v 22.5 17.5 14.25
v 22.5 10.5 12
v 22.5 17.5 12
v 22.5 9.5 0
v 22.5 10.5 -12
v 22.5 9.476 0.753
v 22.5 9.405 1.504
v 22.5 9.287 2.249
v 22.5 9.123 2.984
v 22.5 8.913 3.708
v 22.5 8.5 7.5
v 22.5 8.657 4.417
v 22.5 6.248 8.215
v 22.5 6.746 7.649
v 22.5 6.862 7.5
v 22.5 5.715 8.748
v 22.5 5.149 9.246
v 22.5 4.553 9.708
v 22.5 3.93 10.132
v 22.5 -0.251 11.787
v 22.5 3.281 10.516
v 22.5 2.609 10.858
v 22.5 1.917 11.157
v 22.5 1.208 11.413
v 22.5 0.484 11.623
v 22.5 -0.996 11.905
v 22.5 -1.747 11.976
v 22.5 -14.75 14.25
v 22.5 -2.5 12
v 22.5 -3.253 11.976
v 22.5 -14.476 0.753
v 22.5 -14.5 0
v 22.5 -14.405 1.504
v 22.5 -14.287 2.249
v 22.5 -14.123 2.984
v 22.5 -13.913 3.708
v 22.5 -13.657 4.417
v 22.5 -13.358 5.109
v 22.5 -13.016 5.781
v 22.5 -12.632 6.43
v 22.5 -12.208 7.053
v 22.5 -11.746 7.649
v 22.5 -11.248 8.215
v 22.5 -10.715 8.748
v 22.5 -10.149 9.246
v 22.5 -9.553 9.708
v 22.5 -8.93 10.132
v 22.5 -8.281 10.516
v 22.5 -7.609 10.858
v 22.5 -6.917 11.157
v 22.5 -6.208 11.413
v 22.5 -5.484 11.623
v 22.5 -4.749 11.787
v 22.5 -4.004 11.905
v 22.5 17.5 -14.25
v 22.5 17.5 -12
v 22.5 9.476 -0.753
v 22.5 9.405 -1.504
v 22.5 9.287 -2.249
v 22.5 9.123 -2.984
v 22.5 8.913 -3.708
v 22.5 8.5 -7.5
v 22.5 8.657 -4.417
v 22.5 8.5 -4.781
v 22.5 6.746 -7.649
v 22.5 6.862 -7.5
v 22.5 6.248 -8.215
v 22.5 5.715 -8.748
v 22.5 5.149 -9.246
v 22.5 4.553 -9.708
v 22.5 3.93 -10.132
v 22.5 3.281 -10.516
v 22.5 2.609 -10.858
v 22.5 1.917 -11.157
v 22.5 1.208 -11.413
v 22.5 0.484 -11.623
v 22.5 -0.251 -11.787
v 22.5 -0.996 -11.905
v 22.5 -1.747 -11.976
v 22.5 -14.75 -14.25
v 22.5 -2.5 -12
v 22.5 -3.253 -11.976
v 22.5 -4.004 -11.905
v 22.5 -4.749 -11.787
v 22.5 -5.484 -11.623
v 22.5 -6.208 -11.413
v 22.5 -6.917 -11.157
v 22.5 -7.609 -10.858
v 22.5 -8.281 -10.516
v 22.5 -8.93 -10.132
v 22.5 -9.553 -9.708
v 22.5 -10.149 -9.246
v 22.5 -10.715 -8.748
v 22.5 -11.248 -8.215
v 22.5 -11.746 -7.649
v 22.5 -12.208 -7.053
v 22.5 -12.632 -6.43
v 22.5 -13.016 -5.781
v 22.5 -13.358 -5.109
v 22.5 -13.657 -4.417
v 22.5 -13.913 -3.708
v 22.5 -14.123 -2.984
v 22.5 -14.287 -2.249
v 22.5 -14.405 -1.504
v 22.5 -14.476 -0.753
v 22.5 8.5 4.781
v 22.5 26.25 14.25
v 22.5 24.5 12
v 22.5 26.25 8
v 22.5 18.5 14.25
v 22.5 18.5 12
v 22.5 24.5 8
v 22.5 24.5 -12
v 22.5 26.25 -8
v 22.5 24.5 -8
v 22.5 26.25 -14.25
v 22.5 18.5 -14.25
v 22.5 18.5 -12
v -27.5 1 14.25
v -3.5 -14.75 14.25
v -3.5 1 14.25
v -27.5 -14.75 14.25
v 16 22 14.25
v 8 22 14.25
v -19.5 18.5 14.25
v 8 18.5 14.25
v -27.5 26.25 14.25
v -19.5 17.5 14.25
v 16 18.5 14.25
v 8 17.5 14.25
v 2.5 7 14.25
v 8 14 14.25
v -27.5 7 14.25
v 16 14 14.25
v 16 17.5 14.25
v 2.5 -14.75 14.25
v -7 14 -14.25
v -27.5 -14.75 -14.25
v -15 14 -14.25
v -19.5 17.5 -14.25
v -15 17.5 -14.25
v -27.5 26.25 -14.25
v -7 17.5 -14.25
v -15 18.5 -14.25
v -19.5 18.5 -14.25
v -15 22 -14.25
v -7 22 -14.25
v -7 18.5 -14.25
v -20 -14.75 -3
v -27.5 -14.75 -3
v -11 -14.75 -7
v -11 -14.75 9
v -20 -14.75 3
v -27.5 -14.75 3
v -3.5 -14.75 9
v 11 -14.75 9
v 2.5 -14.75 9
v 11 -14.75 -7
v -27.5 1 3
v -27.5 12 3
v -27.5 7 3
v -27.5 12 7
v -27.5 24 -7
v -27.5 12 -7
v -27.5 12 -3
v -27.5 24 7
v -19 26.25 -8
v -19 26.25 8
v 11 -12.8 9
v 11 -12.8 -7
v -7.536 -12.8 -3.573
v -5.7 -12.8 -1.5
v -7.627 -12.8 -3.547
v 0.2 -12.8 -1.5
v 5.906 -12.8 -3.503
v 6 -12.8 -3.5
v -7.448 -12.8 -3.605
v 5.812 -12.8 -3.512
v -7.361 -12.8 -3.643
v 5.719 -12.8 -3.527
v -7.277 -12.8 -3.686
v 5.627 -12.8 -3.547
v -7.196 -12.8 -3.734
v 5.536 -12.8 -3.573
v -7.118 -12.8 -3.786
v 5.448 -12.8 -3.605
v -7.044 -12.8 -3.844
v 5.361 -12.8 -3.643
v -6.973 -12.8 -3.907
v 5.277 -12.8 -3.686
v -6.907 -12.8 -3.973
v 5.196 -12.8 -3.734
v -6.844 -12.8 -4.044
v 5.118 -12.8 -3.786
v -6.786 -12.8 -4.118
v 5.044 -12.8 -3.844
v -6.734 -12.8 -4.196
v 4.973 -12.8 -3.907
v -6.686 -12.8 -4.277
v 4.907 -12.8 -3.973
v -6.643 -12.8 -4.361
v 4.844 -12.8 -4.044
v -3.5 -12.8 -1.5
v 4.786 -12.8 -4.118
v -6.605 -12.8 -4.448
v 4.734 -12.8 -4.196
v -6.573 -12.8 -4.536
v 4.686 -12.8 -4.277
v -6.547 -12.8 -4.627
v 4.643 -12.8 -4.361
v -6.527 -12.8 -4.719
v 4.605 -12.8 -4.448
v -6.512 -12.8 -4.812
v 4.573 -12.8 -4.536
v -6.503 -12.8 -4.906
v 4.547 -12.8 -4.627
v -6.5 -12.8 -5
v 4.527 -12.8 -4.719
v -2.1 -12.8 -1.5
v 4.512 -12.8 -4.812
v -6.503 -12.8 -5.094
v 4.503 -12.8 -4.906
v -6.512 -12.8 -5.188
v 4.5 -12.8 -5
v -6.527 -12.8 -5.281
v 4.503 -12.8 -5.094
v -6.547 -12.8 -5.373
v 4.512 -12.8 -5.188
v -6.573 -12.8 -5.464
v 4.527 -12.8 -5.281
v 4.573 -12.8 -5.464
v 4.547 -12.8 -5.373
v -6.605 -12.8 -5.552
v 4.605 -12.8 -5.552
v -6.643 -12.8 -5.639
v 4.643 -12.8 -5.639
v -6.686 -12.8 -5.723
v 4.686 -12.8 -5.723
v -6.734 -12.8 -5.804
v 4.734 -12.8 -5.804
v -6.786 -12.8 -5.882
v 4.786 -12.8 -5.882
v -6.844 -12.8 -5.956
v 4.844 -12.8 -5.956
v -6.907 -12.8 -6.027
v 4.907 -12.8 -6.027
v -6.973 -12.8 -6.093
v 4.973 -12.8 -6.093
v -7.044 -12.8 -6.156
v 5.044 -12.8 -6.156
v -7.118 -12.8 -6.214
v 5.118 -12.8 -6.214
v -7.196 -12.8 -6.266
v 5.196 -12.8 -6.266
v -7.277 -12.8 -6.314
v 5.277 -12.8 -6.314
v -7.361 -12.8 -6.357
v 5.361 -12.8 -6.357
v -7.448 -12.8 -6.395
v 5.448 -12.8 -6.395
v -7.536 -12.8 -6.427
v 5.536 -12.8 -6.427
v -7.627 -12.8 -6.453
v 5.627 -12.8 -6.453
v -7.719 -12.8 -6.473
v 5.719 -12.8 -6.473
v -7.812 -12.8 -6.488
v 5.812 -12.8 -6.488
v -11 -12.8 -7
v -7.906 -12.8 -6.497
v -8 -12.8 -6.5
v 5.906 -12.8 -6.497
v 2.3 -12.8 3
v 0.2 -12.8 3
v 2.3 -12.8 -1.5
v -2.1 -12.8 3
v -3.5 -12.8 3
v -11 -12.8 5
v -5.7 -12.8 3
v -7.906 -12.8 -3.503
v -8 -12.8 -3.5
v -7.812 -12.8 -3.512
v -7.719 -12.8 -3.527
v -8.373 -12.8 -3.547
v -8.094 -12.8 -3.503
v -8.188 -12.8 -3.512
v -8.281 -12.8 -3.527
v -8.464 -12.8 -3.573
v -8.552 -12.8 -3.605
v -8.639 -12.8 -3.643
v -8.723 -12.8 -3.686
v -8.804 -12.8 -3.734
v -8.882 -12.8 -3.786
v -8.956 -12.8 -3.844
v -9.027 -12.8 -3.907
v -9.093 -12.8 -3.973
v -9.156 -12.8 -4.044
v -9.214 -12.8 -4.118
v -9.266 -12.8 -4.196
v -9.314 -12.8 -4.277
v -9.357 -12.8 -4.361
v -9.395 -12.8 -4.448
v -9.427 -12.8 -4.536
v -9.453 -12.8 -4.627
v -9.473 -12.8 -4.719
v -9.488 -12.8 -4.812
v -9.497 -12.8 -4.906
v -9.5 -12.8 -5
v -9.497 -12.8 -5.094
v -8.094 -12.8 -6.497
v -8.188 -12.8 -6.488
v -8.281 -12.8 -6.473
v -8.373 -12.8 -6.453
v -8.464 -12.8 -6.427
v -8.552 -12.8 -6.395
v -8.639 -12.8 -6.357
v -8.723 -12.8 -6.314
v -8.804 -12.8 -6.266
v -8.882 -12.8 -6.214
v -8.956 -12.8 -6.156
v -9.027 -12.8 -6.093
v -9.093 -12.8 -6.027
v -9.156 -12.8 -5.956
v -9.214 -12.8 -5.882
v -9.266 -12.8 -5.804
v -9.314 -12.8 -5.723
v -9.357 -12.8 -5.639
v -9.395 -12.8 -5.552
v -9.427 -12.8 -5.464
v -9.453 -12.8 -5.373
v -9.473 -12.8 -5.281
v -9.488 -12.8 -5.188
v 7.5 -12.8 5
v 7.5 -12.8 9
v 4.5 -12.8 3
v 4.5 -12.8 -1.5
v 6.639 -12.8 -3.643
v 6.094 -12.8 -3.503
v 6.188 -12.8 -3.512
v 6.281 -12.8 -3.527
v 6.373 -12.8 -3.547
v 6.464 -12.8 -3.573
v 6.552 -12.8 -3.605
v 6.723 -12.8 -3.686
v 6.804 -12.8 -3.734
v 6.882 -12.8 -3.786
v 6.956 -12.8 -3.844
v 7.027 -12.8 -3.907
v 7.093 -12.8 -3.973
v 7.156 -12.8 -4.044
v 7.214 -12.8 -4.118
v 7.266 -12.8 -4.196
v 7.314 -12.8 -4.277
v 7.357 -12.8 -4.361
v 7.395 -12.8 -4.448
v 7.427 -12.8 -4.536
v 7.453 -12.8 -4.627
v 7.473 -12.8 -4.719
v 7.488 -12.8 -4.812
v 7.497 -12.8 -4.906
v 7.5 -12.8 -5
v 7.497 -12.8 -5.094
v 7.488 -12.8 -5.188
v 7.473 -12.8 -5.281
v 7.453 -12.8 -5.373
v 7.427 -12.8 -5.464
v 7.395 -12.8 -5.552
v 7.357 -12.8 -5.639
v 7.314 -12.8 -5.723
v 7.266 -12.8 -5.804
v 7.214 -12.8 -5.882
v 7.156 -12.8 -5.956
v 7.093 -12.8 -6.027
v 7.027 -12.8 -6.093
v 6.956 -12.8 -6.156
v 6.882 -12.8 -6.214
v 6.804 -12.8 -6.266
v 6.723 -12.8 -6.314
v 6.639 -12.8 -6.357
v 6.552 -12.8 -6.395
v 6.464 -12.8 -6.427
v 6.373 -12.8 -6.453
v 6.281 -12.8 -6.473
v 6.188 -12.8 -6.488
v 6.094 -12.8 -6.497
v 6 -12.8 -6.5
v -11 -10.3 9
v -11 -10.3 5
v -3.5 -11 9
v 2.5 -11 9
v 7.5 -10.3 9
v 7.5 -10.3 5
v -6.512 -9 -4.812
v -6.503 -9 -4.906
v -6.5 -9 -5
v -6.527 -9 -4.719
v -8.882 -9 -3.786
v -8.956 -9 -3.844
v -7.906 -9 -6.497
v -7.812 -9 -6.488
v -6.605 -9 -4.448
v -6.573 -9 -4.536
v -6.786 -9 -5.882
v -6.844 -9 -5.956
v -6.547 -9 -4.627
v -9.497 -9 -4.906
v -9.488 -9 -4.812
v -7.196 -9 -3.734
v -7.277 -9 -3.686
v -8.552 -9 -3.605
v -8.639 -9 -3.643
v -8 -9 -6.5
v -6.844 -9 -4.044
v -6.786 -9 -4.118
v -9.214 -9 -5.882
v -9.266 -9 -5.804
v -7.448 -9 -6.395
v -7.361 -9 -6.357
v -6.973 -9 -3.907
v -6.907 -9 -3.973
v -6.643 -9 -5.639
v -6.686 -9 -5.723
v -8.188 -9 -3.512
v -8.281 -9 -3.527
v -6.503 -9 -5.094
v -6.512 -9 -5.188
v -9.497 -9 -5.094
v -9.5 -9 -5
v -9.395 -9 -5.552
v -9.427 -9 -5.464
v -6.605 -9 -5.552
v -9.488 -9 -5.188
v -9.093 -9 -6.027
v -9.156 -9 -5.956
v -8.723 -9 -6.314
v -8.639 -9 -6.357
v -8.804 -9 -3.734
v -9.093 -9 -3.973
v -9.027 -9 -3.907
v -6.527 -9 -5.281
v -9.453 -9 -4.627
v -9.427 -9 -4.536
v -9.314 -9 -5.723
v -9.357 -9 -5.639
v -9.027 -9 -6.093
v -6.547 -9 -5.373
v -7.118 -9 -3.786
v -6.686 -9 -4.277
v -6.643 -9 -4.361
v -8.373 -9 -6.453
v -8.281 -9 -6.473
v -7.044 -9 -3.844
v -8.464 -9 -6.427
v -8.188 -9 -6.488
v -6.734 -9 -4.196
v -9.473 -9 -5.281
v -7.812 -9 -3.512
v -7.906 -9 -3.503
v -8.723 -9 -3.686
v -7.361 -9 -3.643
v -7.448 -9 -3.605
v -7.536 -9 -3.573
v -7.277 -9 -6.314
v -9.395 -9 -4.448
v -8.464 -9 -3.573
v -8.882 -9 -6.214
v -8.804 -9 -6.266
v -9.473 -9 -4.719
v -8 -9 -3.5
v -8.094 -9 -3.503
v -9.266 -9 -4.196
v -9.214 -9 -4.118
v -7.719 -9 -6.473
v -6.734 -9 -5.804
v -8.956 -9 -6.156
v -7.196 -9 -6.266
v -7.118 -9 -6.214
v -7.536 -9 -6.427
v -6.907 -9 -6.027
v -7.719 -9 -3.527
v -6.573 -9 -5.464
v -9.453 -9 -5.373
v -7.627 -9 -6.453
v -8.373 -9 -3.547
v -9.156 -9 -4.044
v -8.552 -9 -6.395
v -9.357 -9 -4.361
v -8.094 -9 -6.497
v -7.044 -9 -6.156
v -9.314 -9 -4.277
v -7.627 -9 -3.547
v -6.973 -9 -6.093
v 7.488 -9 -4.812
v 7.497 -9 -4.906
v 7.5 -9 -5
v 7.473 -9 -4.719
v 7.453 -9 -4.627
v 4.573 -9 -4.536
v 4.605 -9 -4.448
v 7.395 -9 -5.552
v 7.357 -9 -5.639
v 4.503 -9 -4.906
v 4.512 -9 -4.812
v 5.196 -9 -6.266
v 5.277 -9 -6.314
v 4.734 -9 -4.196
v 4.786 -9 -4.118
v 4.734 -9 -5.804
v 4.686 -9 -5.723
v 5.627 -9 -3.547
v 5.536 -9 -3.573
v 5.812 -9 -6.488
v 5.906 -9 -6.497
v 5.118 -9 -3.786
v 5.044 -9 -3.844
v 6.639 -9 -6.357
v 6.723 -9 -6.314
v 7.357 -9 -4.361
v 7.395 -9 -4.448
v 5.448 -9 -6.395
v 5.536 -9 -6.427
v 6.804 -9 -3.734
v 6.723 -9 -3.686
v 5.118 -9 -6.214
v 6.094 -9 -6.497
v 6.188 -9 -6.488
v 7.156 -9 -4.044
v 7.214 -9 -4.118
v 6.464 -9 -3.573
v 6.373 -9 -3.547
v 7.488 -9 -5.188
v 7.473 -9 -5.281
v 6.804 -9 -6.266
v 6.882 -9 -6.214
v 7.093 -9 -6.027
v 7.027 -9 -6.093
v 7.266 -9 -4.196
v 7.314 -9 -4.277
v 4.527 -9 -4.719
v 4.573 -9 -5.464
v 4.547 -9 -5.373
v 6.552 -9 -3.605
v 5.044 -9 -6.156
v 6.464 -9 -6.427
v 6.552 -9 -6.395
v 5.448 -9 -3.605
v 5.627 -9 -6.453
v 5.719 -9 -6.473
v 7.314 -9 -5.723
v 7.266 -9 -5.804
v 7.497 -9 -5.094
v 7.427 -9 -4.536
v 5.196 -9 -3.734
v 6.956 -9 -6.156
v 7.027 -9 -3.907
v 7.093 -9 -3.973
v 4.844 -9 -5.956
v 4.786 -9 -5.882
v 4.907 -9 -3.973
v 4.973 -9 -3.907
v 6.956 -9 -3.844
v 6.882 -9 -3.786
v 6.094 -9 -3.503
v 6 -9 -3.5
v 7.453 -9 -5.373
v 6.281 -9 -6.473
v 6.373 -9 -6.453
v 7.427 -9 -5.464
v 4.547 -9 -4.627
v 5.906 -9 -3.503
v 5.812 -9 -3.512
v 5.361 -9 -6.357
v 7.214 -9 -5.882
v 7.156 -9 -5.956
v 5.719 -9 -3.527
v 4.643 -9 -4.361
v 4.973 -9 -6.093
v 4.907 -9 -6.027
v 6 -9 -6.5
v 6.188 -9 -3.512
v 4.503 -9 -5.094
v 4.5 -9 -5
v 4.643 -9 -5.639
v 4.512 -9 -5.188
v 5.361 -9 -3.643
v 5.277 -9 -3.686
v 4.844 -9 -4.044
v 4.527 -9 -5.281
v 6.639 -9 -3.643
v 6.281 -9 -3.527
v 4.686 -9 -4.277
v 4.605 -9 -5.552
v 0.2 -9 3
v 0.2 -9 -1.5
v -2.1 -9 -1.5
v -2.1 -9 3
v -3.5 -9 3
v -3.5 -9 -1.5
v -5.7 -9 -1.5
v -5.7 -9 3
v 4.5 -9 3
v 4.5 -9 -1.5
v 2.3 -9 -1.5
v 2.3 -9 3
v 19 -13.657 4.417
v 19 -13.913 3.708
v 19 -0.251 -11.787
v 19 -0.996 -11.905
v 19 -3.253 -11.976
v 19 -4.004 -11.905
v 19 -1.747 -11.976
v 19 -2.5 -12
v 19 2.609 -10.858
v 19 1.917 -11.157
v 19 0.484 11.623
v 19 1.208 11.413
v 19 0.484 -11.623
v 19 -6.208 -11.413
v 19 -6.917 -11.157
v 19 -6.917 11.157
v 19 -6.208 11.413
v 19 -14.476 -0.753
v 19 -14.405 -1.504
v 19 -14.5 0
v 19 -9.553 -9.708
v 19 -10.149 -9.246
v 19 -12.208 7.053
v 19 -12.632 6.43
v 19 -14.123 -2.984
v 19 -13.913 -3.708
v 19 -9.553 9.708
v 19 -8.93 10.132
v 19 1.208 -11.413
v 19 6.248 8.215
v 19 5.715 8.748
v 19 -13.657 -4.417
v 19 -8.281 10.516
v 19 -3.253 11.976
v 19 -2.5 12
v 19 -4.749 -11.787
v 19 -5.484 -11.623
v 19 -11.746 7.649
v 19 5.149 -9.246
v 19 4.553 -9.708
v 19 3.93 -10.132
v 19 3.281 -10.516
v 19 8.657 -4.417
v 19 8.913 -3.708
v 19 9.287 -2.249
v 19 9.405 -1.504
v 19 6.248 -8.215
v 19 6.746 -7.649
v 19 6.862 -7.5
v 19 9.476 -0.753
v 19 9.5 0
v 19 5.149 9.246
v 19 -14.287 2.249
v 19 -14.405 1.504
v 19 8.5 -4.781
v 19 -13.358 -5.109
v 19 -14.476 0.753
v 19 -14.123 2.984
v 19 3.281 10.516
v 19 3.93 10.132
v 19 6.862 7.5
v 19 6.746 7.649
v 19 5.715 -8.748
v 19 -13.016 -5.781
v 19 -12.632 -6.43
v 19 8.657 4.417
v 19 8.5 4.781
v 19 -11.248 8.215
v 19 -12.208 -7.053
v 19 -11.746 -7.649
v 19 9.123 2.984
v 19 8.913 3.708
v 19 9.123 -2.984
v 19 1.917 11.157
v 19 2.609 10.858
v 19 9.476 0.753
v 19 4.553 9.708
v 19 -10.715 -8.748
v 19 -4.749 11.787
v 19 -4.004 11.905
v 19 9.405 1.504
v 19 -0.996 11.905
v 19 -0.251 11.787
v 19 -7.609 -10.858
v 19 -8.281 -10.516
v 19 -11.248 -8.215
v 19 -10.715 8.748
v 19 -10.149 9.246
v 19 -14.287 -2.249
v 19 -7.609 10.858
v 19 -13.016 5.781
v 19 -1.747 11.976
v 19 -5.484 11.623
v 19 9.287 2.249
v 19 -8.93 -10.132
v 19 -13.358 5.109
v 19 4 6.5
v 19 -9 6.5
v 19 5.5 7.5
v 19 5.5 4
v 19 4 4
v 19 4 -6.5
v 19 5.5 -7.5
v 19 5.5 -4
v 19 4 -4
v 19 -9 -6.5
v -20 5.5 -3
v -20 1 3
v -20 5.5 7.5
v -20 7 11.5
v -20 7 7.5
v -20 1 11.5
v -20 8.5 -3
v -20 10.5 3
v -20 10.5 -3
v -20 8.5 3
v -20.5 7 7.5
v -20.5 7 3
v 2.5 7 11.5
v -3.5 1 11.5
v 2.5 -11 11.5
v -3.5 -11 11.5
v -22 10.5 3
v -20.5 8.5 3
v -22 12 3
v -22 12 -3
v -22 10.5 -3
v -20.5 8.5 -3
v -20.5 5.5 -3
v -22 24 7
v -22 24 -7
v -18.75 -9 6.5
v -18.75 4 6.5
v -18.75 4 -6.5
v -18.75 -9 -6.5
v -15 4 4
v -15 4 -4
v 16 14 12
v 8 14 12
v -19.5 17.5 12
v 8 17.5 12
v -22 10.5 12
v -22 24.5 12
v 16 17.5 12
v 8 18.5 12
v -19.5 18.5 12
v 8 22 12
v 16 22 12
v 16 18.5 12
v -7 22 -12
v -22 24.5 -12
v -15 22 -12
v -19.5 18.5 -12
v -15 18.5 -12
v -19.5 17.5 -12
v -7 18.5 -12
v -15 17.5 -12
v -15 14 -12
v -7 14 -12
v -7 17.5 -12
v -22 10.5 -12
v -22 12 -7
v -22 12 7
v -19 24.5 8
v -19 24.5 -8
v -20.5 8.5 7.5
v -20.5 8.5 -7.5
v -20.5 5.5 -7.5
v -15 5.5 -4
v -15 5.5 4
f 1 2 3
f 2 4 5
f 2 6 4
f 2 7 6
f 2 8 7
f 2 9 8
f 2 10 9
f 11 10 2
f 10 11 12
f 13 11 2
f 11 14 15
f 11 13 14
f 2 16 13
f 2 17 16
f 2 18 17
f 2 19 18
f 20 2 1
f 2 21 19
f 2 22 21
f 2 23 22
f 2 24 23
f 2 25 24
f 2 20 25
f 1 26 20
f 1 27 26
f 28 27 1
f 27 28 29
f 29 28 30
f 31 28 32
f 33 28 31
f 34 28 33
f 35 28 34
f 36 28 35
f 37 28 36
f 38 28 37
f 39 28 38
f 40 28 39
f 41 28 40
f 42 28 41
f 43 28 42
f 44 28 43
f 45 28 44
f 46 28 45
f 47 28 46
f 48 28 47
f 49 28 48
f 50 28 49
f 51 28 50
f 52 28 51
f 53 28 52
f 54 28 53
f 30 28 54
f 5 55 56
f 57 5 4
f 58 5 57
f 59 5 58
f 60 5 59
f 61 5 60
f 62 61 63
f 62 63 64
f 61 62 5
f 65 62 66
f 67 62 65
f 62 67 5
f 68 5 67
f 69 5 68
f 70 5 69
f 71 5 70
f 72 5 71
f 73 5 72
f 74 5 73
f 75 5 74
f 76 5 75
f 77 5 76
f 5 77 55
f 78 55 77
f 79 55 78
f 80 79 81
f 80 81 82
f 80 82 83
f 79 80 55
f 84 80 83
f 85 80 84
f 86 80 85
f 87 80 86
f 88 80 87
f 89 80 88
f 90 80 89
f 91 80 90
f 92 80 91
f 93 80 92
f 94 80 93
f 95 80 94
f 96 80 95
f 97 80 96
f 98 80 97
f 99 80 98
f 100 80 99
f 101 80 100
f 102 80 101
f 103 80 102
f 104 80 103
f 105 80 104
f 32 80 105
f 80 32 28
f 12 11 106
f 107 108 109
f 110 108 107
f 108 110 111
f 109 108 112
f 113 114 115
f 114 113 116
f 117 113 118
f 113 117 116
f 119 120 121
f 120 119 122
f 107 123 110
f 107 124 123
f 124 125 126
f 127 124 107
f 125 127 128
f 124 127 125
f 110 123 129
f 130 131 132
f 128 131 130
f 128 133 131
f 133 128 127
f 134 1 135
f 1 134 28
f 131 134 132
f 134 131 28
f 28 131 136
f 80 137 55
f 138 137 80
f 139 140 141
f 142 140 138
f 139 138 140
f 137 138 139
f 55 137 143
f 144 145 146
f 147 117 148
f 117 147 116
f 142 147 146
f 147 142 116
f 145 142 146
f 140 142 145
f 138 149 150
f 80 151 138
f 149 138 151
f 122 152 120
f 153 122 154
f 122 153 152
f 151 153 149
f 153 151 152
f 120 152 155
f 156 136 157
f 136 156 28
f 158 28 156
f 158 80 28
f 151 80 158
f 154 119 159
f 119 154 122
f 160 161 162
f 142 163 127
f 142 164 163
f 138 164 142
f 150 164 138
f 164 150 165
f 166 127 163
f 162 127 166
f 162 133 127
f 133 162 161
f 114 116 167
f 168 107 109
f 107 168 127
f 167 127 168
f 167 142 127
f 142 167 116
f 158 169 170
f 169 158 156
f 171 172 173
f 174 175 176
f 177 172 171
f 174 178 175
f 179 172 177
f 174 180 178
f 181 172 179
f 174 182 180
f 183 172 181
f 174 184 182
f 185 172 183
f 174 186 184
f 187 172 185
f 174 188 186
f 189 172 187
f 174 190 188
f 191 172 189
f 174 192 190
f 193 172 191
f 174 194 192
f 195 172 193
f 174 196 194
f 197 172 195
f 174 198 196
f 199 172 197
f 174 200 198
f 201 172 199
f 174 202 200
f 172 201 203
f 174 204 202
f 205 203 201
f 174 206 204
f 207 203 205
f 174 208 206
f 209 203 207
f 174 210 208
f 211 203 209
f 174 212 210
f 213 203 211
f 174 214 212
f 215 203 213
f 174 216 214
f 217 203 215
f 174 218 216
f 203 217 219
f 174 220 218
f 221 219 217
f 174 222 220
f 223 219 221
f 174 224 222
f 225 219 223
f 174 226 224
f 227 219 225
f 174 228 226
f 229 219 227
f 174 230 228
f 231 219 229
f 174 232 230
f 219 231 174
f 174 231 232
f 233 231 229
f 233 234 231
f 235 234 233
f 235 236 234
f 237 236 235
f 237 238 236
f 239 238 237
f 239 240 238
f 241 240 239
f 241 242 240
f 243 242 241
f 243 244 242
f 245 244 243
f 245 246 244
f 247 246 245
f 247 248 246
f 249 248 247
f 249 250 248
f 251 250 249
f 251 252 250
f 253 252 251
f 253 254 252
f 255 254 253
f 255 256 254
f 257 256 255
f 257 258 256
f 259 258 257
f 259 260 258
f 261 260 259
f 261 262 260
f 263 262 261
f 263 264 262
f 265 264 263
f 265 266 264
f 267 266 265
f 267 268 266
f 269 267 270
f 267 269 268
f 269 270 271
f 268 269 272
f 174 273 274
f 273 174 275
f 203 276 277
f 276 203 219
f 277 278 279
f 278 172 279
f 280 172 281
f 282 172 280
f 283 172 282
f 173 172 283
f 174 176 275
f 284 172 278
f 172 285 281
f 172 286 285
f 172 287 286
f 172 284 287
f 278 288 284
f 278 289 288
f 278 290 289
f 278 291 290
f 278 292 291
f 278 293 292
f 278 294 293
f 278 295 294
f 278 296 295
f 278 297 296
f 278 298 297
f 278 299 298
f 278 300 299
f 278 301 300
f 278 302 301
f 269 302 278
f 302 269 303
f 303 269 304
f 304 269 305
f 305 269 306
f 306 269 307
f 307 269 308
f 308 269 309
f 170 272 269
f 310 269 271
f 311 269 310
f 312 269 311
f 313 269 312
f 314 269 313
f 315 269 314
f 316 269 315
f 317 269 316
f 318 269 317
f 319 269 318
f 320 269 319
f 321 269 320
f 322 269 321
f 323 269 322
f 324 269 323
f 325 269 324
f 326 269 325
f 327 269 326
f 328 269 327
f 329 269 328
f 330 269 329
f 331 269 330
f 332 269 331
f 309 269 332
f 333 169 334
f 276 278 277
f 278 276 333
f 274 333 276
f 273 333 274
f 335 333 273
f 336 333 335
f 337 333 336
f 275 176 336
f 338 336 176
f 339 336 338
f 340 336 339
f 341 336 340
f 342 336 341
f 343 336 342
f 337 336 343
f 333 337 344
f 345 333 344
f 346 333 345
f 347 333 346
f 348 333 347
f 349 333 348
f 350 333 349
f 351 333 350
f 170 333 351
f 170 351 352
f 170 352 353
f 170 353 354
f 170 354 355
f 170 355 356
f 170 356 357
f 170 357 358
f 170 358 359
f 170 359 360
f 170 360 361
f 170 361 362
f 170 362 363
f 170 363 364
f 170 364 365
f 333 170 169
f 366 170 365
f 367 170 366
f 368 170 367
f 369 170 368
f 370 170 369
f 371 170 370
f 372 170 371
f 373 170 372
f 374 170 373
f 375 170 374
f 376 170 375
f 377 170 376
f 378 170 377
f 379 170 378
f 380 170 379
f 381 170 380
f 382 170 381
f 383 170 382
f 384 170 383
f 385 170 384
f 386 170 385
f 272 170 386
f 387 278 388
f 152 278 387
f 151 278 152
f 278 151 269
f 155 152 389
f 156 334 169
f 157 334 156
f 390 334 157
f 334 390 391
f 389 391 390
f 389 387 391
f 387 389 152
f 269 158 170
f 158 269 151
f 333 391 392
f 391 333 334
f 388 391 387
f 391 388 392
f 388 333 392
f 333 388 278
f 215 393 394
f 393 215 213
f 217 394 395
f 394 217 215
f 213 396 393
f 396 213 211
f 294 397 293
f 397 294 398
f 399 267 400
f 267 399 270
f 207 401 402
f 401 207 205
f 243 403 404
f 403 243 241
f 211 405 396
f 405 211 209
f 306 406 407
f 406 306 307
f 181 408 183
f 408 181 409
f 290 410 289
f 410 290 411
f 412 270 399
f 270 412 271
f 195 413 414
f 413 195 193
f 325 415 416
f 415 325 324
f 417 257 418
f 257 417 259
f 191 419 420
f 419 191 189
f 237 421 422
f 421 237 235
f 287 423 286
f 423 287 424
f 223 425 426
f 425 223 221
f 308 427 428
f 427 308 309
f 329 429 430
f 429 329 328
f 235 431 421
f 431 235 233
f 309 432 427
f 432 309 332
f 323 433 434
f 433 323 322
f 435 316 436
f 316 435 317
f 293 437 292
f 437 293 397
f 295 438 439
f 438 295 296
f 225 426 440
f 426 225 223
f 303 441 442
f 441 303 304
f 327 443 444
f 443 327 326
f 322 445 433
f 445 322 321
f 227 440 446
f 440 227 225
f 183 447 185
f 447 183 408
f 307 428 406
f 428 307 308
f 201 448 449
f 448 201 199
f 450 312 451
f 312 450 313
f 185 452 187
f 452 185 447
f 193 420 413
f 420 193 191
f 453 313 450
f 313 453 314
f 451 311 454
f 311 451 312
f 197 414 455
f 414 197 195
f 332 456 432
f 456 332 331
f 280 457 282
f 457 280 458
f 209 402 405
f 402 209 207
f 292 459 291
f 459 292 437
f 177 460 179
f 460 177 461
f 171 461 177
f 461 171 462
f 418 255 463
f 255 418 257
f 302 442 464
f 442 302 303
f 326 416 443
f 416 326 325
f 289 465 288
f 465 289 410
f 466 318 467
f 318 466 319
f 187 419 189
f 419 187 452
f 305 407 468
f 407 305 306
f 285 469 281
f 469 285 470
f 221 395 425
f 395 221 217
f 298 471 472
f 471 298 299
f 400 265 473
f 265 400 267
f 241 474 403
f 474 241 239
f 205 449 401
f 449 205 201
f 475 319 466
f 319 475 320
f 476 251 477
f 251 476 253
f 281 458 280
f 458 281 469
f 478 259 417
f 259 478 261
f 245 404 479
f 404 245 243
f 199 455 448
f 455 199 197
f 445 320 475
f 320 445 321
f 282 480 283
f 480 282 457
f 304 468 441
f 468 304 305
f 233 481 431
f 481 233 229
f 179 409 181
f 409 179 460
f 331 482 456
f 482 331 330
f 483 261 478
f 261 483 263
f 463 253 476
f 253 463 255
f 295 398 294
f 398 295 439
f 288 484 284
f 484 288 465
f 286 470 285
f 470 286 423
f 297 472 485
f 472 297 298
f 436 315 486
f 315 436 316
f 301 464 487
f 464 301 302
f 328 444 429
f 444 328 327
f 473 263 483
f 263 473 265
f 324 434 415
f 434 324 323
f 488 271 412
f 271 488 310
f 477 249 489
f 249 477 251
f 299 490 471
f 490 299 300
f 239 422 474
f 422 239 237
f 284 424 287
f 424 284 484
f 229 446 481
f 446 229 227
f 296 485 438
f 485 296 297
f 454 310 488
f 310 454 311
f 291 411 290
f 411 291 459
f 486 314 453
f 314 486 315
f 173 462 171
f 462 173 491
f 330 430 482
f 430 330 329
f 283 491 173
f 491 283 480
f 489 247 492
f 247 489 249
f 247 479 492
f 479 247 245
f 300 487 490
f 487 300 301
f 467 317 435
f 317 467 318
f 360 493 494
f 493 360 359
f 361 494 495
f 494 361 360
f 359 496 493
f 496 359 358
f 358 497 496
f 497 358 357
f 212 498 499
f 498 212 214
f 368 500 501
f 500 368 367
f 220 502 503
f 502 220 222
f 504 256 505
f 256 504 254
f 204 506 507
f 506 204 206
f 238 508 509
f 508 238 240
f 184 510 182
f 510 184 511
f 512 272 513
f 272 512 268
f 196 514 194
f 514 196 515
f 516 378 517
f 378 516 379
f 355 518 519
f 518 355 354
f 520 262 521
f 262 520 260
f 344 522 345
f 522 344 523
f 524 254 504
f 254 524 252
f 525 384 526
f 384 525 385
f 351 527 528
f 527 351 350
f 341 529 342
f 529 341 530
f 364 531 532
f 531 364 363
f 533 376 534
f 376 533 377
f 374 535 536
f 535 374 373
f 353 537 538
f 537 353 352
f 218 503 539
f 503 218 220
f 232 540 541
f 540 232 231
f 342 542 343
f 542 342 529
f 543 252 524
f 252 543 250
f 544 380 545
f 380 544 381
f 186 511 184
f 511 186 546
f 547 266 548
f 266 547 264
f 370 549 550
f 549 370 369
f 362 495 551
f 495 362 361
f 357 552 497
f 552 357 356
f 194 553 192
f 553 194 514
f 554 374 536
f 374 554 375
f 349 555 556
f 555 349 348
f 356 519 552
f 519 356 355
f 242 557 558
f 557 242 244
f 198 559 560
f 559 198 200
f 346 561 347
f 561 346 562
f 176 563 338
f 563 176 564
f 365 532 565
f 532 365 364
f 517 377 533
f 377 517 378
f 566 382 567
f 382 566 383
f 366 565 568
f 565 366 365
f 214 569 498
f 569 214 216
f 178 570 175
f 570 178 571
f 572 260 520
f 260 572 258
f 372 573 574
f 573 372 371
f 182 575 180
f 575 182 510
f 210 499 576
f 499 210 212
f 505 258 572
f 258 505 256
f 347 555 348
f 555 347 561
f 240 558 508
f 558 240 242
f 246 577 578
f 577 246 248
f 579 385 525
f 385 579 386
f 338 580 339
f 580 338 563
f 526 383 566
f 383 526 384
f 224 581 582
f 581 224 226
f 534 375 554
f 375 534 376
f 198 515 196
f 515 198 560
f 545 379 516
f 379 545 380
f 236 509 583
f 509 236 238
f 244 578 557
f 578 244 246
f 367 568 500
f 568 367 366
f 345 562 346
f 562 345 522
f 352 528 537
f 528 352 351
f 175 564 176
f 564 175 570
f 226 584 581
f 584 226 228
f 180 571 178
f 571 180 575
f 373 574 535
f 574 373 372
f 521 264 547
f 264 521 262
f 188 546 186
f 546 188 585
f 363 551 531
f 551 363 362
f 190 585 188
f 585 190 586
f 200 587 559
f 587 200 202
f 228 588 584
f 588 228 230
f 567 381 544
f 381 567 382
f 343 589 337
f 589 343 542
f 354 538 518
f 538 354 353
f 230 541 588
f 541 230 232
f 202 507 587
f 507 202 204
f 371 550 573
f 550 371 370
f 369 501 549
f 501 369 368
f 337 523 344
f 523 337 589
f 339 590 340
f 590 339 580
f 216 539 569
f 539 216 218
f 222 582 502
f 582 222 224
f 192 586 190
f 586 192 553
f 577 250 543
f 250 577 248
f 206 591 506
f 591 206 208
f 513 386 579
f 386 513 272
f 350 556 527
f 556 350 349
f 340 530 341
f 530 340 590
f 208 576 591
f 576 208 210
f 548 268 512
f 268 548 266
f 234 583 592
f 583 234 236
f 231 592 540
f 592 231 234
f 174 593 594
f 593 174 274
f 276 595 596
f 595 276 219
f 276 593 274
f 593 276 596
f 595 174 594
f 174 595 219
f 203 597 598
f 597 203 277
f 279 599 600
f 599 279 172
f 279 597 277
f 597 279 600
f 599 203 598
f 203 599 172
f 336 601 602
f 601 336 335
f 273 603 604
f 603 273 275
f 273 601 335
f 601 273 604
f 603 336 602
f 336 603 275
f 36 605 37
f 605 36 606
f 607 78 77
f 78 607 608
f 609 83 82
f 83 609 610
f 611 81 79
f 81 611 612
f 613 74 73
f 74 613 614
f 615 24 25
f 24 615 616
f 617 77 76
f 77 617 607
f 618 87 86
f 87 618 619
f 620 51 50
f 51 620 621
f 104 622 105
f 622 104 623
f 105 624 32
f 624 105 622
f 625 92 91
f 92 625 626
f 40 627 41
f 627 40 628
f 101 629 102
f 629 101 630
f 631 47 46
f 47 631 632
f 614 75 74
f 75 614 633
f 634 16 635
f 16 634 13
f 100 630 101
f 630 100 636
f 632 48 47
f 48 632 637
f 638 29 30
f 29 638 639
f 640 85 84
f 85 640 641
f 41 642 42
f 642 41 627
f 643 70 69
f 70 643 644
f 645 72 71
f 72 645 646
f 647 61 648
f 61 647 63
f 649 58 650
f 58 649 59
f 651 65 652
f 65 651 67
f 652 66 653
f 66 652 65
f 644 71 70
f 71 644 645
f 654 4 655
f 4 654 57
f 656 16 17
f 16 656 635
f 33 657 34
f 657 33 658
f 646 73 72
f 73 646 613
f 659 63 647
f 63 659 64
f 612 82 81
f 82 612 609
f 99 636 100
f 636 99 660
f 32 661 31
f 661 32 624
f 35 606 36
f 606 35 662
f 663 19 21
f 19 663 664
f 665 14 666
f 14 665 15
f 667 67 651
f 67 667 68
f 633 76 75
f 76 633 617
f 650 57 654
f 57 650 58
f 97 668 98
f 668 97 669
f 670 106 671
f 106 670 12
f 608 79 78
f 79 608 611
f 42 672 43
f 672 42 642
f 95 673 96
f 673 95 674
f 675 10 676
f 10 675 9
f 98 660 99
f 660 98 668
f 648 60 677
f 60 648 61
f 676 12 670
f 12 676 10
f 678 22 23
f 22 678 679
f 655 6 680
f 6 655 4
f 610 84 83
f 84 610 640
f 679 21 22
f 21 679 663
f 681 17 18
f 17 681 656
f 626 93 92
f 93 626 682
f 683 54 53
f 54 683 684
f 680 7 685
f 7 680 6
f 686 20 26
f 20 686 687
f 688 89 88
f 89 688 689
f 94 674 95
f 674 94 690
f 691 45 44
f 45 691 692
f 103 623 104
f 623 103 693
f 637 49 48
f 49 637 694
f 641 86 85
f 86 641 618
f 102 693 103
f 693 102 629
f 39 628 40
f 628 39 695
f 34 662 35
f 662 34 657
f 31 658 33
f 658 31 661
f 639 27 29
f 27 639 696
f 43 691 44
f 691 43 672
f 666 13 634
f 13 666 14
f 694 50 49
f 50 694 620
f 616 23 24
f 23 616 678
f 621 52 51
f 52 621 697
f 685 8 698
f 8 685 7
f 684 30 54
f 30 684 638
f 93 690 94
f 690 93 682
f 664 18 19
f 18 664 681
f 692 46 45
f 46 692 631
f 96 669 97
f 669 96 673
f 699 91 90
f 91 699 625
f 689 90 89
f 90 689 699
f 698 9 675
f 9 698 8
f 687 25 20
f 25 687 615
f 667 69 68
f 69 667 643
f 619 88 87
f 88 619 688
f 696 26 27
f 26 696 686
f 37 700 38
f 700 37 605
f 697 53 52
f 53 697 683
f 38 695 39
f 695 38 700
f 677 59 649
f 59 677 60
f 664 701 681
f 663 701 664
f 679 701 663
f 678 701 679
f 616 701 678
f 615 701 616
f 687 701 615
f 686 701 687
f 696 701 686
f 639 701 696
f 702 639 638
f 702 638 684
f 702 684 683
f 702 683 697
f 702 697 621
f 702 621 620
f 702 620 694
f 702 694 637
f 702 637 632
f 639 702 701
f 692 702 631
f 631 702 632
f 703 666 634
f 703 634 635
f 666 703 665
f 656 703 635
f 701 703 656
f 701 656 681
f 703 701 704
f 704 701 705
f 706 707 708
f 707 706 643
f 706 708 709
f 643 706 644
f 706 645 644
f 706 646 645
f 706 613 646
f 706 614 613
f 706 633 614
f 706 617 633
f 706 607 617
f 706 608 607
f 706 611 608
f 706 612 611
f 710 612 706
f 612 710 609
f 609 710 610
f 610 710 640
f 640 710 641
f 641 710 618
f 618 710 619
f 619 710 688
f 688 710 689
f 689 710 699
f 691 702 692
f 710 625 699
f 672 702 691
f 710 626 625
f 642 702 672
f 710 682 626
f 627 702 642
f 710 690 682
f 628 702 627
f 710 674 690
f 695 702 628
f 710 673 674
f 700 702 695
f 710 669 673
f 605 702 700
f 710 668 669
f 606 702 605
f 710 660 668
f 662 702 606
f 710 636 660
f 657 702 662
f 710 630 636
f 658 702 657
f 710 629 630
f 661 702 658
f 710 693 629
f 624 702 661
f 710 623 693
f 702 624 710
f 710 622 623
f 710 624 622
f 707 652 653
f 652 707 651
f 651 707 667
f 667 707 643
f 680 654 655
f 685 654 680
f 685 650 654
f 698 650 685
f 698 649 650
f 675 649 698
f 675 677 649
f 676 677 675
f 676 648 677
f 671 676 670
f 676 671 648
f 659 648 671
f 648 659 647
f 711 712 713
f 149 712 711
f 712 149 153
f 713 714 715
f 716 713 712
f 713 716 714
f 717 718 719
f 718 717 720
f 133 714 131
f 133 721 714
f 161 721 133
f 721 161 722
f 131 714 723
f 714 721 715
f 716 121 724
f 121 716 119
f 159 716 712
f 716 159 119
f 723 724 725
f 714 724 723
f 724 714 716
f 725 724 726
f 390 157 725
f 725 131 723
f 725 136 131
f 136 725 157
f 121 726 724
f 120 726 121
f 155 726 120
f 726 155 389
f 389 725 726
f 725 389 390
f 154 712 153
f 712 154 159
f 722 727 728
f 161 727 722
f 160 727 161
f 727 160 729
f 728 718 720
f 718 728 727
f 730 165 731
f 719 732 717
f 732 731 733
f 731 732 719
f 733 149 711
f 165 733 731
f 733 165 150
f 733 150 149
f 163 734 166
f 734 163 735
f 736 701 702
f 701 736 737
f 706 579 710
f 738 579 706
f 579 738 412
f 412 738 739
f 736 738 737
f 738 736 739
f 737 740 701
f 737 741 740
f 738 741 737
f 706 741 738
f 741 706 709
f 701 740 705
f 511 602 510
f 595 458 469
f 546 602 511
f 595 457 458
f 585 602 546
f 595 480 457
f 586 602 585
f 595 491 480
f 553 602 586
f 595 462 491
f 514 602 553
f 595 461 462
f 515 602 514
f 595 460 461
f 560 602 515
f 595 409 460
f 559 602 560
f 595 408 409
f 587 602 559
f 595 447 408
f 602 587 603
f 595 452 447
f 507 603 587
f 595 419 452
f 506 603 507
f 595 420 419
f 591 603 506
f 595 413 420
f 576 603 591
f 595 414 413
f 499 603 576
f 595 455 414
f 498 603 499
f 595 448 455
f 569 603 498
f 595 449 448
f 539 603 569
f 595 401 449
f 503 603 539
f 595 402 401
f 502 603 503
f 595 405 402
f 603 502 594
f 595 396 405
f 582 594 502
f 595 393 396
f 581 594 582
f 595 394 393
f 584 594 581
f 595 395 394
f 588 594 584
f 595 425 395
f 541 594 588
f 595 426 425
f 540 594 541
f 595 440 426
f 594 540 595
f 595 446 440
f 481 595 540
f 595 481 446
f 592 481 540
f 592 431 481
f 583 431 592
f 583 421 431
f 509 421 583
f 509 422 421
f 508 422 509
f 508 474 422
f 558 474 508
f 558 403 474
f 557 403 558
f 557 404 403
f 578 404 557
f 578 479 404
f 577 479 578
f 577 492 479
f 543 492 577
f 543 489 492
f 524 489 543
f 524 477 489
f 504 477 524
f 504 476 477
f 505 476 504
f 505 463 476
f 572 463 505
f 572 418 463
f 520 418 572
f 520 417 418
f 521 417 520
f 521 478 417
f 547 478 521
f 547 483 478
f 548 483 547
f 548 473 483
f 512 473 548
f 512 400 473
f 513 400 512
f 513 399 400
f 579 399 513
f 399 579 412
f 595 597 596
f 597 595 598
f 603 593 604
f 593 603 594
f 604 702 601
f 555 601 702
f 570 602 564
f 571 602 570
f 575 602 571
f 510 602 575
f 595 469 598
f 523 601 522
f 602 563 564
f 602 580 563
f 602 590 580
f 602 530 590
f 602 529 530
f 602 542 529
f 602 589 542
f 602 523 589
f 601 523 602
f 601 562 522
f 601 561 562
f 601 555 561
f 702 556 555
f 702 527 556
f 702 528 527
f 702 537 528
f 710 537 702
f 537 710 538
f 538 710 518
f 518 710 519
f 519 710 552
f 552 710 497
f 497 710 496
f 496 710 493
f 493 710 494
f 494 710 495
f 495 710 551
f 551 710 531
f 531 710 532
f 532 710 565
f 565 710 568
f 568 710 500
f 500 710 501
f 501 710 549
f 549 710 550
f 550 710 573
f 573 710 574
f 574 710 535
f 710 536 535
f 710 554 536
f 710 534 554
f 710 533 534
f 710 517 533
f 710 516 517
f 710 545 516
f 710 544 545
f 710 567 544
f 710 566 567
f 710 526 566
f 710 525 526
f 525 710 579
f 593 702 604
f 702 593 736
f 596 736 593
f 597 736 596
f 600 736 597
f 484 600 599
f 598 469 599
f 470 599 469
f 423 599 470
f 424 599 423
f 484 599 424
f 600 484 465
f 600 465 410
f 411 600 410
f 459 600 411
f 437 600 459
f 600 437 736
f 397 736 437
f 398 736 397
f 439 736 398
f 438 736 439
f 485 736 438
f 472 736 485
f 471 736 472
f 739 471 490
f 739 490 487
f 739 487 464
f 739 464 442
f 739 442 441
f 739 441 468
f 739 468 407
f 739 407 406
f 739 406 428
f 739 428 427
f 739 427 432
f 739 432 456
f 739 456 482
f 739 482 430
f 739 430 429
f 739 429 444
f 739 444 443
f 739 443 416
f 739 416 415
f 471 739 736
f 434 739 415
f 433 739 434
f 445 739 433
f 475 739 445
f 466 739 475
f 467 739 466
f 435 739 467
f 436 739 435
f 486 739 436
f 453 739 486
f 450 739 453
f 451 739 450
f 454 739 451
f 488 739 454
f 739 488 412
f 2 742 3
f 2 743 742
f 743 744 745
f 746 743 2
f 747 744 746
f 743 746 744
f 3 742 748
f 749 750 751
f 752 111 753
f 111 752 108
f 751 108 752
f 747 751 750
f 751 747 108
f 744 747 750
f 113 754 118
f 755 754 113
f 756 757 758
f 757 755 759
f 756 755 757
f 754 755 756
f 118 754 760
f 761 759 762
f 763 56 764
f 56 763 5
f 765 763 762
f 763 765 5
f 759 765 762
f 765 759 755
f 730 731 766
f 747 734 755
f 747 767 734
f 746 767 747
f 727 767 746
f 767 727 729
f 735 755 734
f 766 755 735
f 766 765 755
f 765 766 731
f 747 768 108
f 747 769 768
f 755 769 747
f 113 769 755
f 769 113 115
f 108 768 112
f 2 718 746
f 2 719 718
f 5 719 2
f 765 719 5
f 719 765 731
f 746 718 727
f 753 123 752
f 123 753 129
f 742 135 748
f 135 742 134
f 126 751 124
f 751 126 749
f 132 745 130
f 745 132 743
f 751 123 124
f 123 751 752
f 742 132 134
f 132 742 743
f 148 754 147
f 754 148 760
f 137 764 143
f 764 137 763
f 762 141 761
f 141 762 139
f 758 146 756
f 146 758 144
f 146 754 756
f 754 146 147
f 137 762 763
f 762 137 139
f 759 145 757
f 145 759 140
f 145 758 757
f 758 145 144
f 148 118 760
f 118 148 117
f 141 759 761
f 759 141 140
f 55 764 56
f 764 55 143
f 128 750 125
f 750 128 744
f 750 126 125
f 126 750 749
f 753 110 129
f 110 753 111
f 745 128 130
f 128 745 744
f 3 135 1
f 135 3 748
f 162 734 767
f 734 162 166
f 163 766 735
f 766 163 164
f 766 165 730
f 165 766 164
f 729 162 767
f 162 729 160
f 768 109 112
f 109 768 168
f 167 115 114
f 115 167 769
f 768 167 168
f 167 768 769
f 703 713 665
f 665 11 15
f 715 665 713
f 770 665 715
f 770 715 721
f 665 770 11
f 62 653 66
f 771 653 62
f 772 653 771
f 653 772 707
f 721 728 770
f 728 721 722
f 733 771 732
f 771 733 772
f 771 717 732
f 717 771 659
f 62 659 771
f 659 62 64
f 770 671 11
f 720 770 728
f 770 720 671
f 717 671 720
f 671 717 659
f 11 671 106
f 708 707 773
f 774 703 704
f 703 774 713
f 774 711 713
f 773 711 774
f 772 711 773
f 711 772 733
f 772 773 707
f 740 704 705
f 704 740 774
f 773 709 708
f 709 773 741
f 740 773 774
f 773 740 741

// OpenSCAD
height_pd1=12;
height_pd=12;
 
$fn = 100; 
 w_m5=26.0;// width of m5stick
 h_m5=45;// height of m5stick
 t_m5=16; // thickness of m5stick
 wall=1.5; //wall of the body
 tol=0.5; //tolerance for printing
 
 difference(){
 union() {

     
      translate([0,0,0]) 
     cube ([h_m5,w_m5+tol+3,w_m5+tol+2], center=true);  //cuvette holder
     
           translate([-5,0,0]) 
     cube ([h_m5,w_m5+tol+3,w_m5+tol+2], center=true);  //cuvette holder
     
     
       translate([0,18,0]) 
       cube ([h_m5, t_m5+tol, w_m5+tol+2], center=true);
     
            translate([-5,18,0]) 
       cube ([h_m5, t_m5+tol, w_m5+tol+2], center=true);
 }
 union() {
      

         
          translate([21.0,-2.5,0])
     rotate([0,90,0])
     cylinder(d=24, h=4, center=true);// space for cap
     
  translate([-10,-14.8,-7])
rotate([90,0,0])
ams2();   //space for AMS spectral sensor
     
           translate([-24.0,4,8]) 
            cube ([8, 6, 13], center=true);// for wiring4
    
             translate([-14.0,4,13]) 
            cube ([22, 6, 3], center=true);// for wiring3

      
                  translate([-0.5,-14,10]) 
            cube ([6, 6, 3], center=true);// for wiring3c
     
            translate([-0.5,-4,13]) 
            cube ([6, 22, 3], center=true);// for wiring2
     
           translate([-24.0,4,0]) 
            cube ([8, 40, 6], center=true);// for wiring1 bottom
     
     translate([4,-2.5,0]) 
          cube ([h_m5+tol,13.0,13.0], center=true); //cuvette
            color([1,0,0.5])
        translate([0.5,17.5,0]) 
            cube ([ h_m5, t_m5-wall-0.5, w_m5-wall-0.5], center=true);//m5stickc
            
translate([12,18,13]) 
cube ([8, 8, 3], center=true);// for m5 buttonB

 
 
 translate([-11,18,-13]) 
cube ([8, 8, 3], center=true);// for m5 buttonC
 
 
  translate([3,18,-13]) 
cube ([h_m5, 1, 3], center=true);// for m5 slit1


translate([3,18,13]) 
cube ([h_m5, 1, 3], center=true);// for m5 slit2
 
               color([0.5,0,0.5])
        translate([-20,18,0]) 
           cube ([20,12,14], center=true); 
     
        translate([3,28,0]) 
           cube([44,10,16], center=true);//oled screen
     
             translate([2,7,0]) 
     cube ([45,3,15], center=true);  //optical_filter
     
     
             translate([5,3,0]) 
           cube([40,8,8], center=true);//optical sensor window 
   
 }
 }


module ams1(){

union(){
    translate([0,0,-1])
cube ([22.5,20.5,2.0]);  // PCB


color([0.4,0.6,0.1])
translate([3.4,3,-2.0])
union(){
translate([0,0,0])
cylinder(d=2.9, h=10);//screw hole1

translate([15.1,0,0])
cylinder(d=2.9, h=10);//screw hole2
}
}
union(){


color([0.4,0.6,0.5])

translate([0,8.5,-2.5])
union(){
    
    translate([10-0.1,0,0])
cube ([2.2,3.5,4]); //Ams sensor
translate([6.1,0,0])    
cube ([1.5,3.5,4]); //LED1
    translate([14.1,0,0])    
cube ([1.5,3.5,4]); //LED2
    
}
}


}

module ams2(){

union(){
       translate([-1,0,-2])
cube ([22,16,5.0]);  // PCB

       translate([-1.0,12,-4.5])
cube ([18.5,4,3.0]);  // PCB holes 


}
union(){

    
color([0.4,0.6,0.1])
translate([2,2,-4.0])
union(){
translate([0,0,-2])
cylinder(d=3, h=10);//screw hole1

translate([14,0,-2])
cylinder(d=3, h=10);//screw hole2
}
color([0.4,0.6,0.5])

translate([0,5.5,-4.5])
union(){
    
    translate([8-0.1,0,-2])
cube ([2.3,4.5,10]); //Ams sensor
translate([4.3,0,-2])    
cube ([2.2,4.5,10]); //LED1
    translate([12.3,0,-2])    
cube ([2.2,4.5,10]); //LED2
    
}
}
}






 module cap(){
difference(){
 union() {
 rotate([0,90,0])
         translate([0,0,0])
     cylinder(d=23.5, h=12, center=true);
     
 }

 union() {
              translate([-0.1,0.0,0.0])
 rotate([0,90,0])

     cylinder(d=20, h=12, center=true);
     }
 
 }
 }
 
//translate([30,-3,0])
//cap();
 
  //translate([-10,-12,-7])
//rotate([90,0,0])
//ams2();
 
 

     
